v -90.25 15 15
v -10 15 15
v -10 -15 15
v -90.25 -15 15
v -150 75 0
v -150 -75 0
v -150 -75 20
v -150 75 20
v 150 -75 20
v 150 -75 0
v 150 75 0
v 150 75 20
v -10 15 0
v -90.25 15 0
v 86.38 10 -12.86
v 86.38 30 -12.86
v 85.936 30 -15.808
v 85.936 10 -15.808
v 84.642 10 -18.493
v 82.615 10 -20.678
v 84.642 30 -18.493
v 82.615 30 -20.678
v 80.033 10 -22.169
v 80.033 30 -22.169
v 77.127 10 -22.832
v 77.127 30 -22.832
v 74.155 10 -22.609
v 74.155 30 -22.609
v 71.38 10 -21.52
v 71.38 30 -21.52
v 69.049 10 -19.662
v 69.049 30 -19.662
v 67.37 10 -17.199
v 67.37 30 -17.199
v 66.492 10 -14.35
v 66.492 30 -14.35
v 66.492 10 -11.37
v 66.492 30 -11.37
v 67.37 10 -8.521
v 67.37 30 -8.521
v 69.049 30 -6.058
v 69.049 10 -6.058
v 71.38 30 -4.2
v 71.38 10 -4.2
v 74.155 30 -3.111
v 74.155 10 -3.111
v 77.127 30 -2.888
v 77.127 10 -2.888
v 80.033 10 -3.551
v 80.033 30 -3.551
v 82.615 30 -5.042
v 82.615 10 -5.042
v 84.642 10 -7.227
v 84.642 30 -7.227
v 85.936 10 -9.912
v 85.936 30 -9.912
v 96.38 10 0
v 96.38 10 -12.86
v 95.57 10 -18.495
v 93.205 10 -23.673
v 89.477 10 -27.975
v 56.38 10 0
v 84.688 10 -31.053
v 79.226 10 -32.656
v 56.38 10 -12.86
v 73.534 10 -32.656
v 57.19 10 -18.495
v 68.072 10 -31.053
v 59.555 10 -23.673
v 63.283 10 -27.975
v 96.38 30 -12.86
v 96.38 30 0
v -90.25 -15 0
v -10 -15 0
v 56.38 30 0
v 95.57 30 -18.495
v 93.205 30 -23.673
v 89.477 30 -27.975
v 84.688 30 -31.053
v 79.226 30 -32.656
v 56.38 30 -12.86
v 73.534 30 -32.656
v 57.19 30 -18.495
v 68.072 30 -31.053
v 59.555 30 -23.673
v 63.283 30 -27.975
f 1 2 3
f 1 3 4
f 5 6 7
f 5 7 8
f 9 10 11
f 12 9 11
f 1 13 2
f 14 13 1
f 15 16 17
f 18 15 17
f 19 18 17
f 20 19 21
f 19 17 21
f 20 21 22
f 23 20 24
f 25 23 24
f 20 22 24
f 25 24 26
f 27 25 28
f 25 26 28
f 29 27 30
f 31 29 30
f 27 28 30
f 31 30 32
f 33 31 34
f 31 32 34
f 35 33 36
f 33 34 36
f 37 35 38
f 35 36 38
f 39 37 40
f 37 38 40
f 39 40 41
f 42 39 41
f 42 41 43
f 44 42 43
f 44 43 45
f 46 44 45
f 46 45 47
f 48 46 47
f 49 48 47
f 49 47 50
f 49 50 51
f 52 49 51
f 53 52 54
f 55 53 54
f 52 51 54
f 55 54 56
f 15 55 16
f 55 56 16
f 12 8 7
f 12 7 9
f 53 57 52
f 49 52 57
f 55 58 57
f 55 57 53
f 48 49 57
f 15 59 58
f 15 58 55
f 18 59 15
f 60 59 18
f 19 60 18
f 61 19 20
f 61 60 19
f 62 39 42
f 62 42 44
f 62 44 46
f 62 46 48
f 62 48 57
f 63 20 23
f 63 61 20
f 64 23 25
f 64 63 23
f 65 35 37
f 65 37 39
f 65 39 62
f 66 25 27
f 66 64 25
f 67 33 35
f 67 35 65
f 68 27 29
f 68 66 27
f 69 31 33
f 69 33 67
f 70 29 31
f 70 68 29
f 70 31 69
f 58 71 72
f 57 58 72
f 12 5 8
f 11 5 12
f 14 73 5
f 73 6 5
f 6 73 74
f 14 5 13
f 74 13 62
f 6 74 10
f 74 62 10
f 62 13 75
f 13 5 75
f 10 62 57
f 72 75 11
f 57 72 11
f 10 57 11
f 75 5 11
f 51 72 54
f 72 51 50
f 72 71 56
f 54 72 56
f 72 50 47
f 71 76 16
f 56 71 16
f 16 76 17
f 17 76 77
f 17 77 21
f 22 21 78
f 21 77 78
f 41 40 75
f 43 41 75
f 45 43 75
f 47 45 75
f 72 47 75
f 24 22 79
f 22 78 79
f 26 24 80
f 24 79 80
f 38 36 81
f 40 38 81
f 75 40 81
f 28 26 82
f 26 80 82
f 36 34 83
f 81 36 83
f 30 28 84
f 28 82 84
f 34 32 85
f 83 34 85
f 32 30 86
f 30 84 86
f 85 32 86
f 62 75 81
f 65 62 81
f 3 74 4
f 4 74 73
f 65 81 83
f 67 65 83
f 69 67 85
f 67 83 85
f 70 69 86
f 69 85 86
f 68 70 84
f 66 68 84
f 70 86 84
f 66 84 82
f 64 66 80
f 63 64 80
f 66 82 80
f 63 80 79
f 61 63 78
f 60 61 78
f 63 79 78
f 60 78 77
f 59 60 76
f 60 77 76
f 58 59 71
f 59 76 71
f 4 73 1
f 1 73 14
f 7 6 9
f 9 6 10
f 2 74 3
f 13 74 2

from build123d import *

# Parameters (mm, degrees)
SKETCH1_W           = 300
SKETCH1_H           = 150
BOSS_EXTRUDE1_DEPTH = 20
SKETCH2_W           = 80.25
SKETCH2_H           = 30
CUT_EXTRUDE1_DEPTH  = 15
SKETCH3_R           = 10
BOSS_EXTRUDE2_DEPTH = 20


with BuildPart() as part:
    # Sketch1 → Boss-Extrude1 (new body)
    with BuildSketch(Plane.XY):
        Rectangle(SKETCH1_W, SKETCH1_H)
    extrude(amount=BOSS_EXTRUDE1_DEPTH)

    # Sketch2 → Cut-Extrude1 (cut)
    with BuildSketch(Plane(origin=(0, 0, 0), x_dir=(-1, 0, 0), z_dir=(0, 0, -1))):
        with Locations((50.125, 0)):
            Rectangle(SKETCH2_W, SKETCH2_H)
    extrude(amount=-CUT_EXTRUDE1_DEPTH, mode=Mode.SUBTRACT)

    # Sketch3 → Boss-Extrude2 (add)
    with BuildSketch(Plane(origin=(0, 30, 0), x_dir=(1, 0, 0), z_dir=(0, 1, 0))):
        with BuildLine():
            Line((56.38, 0), (56.38, 12.86))
            ThreePointArc((56.38, 12.86), (76.38, 32.86), (96.38, 12.86))
            Line((96.38, 12.86), (96.38, 0))
            Line((96.38, 0), (56.38, 0))
        make_face()
        with Locations((76.38, 12.86)):
            Circle(SKETCH3_R, mode=Mode.SUBTRACT)
    extrude(amount=-BOSS_EXTRUDE2_DEPTH)


solid = part.part
